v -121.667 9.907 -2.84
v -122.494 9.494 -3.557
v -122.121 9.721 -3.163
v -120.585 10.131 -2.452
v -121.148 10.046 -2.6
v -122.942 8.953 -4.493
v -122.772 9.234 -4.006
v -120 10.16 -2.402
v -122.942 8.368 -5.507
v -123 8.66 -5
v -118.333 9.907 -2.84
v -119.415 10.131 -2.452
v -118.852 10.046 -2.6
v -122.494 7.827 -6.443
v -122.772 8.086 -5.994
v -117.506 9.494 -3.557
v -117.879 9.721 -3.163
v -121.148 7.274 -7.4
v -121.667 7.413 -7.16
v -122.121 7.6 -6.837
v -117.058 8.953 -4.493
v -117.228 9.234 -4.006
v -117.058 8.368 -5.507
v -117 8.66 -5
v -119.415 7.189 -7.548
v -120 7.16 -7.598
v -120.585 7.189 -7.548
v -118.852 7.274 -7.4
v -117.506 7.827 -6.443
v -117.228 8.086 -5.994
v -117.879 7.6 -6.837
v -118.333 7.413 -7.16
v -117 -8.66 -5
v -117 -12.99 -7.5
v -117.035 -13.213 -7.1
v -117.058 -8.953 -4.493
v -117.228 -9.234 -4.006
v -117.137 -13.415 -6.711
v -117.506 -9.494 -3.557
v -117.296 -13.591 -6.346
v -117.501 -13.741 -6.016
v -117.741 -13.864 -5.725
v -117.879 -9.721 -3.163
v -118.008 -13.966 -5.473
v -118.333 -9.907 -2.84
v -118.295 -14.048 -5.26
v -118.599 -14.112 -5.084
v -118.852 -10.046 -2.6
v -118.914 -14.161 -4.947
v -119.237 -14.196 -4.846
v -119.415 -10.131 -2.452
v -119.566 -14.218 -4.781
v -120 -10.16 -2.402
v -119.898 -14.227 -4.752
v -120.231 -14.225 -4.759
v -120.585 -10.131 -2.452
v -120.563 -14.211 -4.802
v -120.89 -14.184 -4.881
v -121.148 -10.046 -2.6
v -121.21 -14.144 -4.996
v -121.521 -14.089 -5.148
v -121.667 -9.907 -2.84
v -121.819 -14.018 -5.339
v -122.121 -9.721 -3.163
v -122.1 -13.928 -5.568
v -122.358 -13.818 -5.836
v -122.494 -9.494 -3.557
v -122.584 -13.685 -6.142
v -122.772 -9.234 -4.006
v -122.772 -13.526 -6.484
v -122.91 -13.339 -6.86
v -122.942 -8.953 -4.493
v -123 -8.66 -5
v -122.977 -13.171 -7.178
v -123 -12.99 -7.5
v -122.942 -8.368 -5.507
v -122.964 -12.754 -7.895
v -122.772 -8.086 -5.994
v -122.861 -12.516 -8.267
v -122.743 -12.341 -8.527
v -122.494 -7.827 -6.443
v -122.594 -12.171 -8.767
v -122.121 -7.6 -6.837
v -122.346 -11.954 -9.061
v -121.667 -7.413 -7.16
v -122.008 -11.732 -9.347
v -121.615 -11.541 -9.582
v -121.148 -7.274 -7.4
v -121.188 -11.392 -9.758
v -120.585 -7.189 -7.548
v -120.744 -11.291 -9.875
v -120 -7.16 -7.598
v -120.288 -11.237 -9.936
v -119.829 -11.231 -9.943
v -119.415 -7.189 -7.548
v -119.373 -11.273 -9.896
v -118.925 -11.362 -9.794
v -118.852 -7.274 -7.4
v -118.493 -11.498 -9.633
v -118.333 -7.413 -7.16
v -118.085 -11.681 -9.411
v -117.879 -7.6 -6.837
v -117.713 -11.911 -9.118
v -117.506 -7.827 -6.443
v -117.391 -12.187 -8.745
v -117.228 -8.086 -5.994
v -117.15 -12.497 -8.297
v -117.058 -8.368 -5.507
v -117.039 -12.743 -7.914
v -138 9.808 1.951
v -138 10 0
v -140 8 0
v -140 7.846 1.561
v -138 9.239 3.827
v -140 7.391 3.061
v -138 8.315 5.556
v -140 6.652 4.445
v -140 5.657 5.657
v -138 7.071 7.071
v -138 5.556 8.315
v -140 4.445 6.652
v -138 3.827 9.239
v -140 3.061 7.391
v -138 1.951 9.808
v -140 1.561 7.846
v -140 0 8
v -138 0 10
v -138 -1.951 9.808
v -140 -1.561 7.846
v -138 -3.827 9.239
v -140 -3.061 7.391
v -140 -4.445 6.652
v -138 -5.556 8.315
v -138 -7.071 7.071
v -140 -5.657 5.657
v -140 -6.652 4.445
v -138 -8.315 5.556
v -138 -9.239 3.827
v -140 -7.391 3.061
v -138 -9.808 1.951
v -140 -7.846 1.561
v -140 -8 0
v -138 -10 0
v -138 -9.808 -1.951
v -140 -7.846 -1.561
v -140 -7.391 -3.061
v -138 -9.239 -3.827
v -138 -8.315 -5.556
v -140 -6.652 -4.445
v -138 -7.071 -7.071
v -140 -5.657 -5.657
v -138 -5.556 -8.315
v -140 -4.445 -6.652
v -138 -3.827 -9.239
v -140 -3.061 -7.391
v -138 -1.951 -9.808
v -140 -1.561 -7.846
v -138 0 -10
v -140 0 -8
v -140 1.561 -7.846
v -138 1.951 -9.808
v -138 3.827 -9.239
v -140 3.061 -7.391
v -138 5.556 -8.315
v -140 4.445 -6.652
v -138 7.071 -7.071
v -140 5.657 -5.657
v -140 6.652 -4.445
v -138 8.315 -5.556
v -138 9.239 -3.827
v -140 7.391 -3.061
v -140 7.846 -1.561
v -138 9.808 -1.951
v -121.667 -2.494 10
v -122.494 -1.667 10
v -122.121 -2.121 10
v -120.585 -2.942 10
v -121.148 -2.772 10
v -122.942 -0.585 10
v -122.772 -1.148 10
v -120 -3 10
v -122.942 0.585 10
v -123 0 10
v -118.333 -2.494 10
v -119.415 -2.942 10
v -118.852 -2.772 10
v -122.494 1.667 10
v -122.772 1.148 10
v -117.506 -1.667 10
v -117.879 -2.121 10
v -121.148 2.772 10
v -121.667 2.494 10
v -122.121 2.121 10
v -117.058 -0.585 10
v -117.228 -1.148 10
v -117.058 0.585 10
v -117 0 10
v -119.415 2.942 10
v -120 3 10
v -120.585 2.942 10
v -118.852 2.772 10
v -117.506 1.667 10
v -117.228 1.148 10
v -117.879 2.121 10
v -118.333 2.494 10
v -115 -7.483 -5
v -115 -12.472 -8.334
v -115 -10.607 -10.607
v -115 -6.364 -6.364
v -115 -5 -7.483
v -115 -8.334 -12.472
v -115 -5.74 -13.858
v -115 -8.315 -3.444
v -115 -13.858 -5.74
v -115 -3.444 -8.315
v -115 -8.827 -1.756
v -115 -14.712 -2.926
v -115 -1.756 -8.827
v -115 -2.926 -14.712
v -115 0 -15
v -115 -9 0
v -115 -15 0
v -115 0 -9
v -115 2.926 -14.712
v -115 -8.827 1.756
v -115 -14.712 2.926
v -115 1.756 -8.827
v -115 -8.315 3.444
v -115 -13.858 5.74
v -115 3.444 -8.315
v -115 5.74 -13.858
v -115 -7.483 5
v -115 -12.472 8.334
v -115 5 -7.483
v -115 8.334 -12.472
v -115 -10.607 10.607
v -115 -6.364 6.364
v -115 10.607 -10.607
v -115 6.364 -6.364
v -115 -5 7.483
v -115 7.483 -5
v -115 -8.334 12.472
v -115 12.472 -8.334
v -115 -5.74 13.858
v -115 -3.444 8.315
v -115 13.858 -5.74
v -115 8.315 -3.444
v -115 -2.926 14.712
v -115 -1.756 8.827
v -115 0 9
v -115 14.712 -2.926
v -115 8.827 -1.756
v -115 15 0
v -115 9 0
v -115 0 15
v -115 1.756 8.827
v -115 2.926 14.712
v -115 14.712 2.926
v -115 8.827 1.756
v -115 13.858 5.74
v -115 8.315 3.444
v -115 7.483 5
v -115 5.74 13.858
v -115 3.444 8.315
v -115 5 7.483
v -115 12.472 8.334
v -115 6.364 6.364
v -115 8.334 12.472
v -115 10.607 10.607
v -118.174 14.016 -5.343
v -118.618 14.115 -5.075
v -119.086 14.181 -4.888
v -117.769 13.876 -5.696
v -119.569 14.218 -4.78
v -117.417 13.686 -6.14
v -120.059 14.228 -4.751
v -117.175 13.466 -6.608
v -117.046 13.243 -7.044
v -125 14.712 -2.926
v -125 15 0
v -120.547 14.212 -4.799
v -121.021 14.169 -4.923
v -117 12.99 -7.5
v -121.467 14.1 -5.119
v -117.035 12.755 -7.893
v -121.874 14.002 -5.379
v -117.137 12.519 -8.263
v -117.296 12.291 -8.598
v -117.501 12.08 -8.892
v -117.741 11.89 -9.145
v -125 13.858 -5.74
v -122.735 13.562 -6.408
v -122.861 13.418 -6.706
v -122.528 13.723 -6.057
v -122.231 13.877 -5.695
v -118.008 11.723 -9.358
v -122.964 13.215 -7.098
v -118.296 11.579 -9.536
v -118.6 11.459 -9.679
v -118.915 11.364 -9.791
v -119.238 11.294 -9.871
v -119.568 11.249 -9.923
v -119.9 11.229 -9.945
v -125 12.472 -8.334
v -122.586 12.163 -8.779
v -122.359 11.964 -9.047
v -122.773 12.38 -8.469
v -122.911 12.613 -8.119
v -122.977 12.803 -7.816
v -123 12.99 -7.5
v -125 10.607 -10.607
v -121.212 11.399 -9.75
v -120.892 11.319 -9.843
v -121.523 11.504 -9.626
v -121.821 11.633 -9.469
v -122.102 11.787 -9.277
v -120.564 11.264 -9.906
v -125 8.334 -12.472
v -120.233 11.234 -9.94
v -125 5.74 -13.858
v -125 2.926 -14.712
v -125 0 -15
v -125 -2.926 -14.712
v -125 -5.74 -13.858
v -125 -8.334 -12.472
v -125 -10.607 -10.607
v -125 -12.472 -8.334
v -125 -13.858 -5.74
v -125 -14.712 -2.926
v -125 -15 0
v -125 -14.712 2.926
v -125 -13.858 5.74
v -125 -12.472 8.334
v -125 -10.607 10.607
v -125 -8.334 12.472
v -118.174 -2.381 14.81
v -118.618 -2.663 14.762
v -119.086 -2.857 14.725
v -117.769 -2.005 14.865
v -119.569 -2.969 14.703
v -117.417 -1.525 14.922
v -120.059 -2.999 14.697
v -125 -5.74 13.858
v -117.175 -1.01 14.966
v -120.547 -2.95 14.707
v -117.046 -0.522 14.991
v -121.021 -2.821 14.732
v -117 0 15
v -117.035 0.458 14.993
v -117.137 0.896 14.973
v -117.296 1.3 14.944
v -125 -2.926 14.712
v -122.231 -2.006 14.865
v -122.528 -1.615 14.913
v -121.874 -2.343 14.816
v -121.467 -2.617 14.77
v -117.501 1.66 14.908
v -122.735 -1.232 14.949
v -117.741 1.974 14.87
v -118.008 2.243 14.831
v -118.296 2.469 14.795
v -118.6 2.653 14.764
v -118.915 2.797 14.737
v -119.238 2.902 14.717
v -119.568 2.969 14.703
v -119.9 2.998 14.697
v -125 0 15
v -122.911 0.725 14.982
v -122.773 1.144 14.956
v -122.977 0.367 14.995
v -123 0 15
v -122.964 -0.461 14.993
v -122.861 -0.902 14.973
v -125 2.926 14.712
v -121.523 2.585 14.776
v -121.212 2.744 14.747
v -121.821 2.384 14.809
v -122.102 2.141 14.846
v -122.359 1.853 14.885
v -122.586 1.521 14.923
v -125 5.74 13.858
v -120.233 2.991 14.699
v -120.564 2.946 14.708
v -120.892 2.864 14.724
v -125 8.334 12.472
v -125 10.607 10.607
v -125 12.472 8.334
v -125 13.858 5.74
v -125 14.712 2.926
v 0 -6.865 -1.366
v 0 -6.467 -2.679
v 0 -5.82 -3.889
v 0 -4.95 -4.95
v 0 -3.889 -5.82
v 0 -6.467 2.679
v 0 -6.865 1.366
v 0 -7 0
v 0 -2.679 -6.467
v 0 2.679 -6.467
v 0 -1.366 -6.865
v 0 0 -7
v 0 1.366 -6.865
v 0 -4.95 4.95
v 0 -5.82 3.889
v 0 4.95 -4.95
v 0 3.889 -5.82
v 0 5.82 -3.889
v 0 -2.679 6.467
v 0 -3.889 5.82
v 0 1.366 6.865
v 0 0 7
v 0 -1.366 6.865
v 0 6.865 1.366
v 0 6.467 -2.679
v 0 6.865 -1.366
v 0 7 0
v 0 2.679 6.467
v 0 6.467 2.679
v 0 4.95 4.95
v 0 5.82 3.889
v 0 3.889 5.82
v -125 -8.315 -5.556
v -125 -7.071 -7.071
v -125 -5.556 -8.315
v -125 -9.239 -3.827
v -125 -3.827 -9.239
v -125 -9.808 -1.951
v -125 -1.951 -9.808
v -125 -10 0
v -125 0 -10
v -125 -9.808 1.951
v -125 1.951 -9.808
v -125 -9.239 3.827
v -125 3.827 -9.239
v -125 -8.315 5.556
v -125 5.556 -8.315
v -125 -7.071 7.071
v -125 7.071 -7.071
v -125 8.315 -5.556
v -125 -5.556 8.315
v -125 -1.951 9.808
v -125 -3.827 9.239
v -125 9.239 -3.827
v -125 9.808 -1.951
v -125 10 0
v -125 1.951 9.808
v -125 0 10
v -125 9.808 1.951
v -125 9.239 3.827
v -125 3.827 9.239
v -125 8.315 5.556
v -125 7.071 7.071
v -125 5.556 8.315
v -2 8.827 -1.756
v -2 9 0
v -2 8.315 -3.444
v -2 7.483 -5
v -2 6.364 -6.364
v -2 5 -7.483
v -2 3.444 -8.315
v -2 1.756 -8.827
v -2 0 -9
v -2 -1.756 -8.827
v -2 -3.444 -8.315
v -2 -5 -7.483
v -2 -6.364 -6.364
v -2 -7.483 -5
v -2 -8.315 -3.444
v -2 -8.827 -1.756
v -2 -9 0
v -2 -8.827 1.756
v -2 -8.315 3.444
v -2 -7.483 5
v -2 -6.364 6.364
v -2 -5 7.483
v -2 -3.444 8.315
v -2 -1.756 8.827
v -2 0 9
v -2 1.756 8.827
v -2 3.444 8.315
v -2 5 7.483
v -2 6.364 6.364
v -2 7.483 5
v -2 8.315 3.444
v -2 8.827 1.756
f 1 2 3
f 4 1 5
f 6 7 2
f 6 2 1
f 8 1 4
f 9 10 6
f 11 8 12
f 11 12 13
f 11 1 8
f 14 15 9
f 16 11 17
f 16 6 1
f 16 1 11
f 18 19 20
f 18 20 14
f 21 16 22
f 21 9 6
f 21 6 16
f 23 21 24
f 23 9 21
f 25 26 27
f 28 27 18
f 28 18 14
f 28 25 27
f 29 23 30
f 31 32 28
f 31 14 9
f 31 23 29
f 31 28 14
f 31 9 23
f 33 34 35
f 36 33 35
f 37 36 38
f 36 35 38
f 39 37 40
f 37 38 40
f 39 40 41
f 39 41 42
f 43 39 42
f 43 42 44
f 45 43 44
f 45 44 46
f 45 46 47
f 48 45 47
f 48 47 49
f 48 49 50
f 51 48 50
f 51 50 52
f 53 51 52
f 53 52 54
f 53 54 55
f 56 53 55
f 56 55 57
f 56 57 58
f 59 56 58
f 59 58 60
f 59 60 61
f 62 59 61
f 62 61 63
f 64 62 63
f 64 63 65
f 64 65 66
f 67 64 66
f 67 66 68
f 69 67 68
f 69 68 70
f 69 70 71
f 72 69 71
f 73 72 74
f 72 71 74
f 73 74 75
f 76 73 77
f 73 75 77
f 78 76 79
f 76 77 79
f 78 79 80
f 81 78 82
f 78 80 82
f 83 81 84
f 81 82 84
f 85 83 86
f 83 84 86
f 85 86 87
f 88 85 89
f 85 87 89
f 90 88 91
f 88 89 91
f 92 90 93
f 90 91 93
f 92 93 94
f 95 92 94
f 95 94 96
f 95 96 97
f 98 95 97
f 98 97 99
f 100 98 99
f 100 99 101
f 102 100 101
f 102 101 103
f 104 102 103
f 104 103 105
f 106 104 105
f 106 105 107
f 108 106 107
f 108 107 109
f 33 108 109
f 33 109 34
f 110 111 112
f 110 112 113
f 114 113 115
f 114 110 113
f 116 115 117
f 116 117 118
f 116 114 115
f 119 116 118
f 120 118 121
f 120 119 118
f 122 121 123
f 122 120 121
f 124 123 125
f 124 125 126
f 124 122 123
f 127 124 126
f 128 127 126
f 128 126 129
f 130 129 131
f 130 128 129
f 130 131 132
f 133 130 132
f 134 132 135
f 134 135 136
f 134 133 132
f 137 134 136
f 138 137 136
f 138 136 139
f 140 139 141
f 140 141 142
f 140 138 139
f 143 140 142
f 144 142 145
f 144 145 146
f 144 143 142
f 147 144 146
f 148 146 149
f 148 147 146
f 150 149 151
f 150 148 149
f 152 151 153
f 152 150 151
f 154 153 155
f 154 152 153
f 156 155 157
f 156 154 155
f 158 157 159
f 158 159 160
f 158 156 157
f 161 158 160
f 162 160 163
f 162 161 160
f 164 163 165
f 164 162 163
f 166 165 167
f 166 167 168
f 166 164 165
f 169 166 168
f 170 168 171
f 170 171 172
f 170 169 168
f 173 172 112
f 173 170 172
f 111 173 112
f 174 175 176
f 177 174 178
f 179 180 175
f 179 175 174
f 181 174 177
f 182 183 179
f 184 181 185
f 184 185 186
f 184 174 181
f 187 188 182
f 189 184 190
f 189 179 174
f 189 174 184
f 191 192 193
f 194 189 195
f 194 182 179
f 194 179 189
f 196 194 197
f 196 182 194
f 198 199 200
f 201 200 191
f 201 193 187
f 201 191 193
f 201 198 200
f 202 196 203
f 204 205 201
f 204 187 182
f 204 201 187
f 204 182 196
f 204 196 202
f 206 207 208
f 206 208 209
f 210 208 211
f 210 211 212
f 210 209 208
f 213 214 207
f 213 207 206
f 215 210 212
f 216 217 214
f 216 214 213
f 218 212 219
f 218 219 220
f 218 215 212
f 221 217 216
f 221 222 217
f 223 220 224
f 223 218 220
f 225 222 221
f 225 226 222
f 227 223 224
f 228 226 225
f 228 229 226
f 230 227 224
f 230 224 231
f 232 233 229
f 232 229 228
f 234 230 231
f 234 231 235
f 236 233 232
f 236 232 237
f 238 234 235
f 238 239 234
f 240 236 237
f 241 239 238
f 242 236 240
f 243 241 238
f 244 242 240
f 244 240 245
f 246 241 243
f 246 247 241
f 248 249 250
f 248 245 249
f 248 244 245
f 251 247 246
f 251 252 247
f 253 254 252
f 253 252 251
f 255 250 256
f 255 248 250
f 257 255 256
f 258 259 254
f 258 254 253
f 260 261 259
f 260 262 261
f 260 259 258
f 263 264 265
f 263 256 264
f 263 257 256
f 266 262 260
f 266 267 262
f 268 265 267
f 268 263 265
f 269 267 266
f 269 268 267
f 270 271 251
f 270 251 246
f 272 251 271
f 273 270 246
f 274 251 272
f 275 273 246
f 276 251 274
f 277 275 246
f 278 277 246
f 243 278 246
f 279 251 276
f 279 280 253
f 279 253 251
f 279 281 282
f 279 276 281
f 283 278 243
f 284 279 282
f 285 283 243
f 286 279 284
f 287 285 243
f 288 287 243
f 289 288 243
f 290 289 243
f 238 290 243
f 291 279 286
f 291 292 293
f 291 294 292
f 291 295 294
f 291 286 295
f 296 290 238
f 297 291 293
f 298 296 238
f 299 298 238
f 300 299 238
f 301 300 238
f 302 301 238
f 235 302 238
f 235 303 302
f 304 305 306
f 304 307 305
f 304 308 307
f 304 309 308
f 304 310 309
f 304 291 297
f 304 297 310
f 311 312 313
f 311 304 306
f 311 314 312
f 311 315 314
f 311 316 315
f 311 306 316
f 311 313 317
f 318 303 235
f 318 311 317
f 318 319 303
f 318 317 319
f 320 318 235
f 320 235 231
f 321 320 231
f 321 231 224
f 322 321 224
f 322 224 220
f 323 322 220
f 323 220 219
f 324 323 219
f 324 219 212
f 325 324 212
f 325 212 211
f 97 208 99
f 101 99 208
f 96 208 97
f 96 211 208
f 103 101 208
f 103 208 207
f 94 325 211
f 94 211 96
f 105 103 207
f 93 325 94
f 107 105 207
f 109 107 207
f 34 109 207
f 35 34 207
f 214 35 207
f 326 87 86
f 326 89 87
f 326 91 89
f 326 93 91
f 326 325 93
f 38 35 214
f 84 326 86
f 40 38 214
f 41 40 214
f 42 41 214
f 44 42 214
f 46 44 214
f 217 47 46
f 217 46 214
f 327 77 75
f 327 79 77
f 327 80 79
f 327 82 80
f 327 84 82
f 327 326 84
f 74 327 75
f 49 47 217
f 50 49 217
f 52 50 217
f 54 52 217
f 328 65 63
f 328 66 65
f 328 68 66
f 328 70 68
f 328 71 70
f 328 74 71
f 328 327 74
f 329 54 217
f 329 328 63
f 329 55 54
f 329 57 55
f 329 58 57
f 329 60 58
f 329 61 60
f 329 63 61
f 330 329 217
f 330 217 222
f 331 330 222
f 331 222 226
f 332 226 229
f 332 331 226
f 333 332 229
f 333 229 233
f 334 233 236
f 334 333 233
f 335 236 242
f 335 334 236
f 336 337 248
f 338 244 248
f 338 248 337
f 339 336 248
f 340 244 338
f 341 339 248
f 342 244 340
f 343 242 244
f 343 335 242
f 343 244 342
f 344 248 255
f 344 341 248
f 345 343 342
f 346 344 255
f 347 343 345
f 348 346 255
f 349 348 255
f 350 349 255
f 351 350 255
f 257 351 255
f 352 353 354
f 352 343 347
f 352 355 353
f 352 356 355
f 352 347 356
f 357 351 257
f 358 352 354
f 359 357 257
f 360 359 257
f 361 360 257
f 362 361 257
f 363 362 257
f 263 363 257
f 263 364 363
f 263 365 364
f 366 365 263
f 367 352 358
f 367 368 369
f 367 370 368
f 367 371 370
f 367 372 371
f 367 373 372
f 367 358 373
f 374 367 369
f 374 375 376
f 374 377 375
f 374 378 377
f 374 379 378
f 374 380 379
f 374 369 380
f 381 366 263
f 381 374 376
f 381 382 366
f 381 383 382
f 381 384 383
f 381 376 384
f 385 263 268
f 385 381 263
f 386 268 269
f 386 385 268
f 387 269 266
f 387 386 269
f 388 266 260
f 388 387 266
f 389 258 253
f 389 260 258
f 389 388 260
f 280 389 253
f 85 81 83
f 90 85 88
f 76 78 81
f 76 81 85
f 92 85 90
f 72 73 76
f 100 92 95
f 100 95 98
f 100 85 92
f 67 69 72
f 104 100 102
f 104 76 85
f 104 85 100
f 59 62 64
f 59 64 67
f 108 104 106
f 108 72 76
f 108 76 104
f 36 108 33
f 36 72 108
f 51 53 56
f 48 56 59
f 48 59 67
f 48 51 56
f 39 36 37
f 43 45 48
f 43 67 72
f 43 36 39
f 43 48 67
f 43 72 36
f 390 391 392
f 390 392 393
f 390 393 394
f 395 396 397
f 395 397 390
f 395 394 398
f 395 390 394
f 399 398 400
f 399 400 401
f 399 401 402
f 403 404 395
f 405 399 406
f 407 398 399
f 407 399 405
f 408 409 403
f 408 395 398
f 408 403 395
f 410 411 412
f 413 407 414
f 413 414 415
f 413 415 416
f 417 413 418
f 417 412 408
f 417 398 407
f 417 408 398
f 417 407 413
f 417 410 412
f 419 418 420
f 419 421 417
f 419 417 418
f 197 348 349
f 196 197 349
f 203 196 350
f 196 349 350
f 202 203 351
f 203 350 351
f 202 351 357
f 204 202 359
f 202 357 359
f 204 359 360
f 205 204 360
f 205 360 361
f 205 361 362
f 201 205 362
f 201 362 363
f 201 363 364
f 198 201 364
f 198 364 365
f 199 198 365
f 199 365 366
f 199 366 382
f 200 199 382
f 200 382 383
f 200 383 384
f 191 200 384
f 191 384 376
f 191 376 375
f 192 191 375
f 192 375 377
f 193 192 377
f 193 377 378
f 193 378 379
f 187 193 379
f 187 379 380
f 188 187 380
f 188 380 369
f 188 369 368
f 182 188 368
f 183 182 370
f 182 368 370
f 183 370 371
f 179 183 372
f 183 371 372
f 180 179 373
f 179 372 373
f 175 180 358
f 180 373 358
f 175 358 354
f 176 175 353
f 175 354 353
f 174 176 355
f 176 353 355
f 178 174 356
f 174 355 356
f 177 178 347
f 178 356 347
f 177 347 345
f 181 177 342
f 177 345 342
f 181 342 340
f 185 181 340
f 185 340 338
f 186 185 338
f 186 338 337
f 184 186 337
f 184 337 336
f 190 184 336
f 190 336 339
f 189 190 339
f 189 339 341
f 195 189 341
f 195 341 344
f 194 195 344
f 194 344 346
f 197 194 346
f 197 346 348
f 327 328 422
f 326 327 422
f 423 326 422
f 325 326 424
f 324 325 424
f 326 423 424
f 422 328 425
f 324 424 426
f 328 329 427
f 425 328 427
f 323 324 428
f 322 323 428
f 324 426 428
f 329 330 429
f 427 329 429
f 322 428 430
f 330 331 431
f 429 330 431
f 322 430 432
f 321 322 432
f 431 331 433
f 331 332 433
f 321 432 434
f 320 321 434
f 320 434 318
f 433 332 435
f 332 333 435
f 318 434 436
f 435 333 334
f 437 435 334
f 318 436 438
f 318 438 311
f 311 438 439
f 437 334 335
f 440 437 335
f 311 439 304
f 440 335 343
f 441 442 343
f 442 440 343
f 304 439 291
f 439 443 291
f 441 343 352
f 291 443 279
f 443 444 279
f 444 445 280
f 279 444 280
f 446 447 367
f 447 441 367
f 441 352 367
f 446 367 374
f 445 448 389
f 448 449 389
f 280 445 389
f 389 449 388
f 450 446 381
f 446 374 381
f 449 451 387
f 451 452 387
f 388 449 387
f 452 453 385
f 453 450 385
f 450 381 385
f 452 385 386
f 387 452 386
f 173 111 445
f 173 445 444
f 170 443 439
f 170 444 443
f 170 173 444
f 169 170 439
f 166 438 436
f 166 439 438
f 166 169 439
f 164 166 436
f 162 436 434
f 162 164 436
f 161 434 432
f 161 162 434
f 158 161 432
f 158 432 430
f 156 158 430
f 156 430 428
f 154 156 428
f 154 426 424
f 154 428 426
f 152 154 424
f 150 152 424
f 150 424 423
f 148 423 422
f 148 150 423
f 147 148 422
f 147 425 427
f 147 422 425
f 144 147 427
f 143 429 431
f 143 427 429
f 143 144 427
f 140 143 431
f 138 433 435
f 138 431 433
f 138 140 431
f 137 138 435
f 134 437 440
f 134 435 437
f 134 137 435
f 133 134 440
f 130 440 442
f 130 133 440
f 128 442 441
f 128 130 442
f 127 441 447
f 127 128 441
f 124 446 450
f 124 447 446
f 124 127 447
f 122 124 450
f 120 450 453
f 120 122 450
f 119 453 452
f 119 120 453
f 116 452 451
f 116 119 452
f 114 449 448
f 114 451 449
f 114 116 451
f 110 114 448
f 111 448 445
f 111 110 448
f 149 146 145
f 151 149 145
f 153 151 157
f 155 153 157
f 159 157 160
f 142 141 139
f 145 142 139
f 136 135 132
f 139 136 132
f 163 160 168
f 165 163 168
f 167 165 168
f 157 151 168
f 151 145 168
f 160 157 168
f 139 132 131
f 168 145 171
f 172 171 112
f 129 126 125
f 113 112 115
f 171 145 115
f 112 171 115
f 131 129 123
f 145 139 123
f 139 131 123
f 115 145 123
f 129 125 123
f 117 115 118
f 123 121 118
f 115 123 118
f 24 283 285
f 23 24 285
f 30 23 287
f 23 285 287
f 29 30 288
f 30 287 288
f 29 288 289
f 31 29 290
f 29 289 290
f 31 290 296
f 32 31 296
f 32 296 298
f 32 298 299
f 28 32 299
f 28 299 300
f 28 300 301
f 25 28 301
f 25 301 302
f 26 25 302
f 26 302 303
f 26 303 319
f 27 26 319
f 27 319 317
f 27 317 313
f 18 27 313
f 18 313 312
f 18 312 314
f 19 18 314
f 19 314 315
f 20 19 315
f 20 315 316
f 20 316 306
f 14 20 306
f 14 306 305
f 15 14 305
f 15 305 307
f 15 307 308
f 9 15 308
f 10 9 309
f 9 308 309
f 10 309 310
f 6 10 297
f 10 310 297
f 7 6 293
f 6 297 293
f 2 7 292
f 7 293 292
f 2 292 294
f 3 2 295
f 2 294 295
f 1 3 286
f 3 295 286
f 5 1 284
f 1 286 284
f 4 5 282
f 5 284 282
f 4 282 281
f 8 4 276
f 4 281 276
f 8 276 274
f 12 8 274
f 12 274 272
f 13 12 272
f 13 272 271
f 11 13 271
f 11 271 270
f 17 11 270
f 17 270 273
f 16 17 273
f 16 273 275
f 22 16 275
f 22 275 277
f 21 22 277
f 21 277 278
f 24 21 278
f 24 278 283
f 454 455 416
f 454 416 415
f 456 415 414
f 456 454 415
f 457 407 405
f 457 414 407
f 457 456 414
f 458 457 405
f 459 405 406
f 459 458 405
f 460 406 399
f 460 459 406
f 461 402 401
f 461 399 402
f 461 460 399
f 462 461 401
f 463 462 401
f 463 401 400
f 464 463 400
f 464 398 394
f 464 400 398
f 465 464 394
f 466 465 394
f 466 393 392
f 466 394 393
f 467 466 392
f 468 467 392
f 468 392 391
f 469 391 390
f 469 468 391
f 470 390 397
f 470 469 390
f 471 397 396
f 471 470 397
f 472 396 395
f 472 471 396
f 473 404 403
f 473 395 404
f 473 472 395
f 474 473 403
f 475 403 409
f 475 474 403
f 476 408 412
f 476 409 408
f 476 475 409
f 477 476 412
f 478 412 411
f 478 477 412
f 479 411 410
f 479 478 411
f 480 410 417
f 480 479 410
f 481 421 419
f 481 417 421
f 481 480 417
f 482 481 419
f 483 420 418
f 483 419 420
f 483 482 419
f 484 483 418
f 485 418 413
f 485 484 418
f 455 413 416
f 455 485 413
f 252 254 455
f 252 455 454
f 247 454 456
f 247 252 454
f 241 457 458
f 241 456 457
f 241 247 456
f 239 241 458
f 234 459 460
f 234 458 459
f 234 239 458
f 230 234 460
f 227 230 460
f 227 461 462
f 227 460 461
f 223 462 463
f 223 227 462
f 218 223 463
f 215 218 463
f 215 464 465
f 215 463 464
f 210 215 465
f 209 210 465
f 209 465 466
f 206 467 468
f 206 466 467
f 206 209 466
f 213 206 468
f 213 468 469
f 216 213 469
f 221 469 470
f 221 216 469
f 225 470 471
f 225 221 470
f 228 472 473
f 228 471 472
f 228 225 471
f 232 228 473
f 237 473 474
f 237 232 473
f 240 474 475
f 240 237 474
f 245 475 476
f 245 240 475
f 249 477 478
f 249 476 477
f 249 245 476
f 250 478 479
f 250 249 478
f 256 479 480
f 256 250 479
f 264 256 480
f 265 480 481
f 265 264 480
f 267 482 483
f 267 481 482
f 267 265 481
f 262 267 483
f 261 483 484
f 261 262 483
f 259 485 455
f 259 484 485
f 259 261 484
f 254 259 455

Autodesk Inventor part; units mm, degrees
ref_plane "YZ Plane" through (0, 0, 0) normal (1, 0, 0) x (0, 1, 0)
ref_plane "XZ Plane" through (0, 0, 0) normal (0, 1, 0) x (-1, 0, 0)
sketch "Sketch1" plane through (0, 0, 0) normal (0, 0, 1) x (1, 0, 0)
  line L0 (0, 0) -> (-140, 0)
  line L1 (0, 0) -> (0, 7)
  line L2 (-2, 9) -> (-115, 9)
  line L3 (-115, 9) -> (-115, 15)
  line L4 (-115, 15) -> (-125, 15)
  line L5 (-125, 15) -> (-125, 10)
  line L6 (-125, 10) -> (-138, 10)
  line L7 (-140, 8) -> (-140, 0)
  line L8 (-138, 10) -> (-140, 8)
  line L9 (-2, 9) -> (0, 7)
  line L10 (-267.7899, 0) -> (-197.3543, 0) construction
  point P0 (0, 9)
  point P1 (-140, 10)
  point P2 (-120, 15)
  dimension "d1" = 140
  dimension "d2" = 15
  dimension "d3" = 10
  dimension "d4" = 15
  dimension "d5" = 9
  dimension "d6" = 10
  dimension "d7" = 2
  dimension "d8" = 2
  dimension "d9" = 2
  dimension "d10" = 2
revolve "Revolution1" add sketch "Sketch1" angle 360 about axis through (-267.7899, 0, 0) along (1, 0, 0)
ref_plane "Work Plane1" through (0, 0, 15) normal (0, 0, 1) x (1, 0, 0)
sketch "Sketch2" plane through (0, 0, 15) normal (0, 0, 1) x (1, 0, 0)
  circle A0 centre (-120, 0) radius 3
  line L0 (-115, -15) -> (-115, 15) projected
  point P0 (0, 0)
  dimension "d13" = 6
  dimension "d14" = 5
extrude "Extrusion1" cut sketch "Sketch2" against normal blind 5
pattern_circular "Circular Pattern1" count 3 over 360 about axis through (-58.5, 0, 0) along (1, 0, 0) of "Extrusion1"
equation "\"d8\" = d7"
equation "\"d10\" = d9"
properties part number "Coluna do Ferramental"
